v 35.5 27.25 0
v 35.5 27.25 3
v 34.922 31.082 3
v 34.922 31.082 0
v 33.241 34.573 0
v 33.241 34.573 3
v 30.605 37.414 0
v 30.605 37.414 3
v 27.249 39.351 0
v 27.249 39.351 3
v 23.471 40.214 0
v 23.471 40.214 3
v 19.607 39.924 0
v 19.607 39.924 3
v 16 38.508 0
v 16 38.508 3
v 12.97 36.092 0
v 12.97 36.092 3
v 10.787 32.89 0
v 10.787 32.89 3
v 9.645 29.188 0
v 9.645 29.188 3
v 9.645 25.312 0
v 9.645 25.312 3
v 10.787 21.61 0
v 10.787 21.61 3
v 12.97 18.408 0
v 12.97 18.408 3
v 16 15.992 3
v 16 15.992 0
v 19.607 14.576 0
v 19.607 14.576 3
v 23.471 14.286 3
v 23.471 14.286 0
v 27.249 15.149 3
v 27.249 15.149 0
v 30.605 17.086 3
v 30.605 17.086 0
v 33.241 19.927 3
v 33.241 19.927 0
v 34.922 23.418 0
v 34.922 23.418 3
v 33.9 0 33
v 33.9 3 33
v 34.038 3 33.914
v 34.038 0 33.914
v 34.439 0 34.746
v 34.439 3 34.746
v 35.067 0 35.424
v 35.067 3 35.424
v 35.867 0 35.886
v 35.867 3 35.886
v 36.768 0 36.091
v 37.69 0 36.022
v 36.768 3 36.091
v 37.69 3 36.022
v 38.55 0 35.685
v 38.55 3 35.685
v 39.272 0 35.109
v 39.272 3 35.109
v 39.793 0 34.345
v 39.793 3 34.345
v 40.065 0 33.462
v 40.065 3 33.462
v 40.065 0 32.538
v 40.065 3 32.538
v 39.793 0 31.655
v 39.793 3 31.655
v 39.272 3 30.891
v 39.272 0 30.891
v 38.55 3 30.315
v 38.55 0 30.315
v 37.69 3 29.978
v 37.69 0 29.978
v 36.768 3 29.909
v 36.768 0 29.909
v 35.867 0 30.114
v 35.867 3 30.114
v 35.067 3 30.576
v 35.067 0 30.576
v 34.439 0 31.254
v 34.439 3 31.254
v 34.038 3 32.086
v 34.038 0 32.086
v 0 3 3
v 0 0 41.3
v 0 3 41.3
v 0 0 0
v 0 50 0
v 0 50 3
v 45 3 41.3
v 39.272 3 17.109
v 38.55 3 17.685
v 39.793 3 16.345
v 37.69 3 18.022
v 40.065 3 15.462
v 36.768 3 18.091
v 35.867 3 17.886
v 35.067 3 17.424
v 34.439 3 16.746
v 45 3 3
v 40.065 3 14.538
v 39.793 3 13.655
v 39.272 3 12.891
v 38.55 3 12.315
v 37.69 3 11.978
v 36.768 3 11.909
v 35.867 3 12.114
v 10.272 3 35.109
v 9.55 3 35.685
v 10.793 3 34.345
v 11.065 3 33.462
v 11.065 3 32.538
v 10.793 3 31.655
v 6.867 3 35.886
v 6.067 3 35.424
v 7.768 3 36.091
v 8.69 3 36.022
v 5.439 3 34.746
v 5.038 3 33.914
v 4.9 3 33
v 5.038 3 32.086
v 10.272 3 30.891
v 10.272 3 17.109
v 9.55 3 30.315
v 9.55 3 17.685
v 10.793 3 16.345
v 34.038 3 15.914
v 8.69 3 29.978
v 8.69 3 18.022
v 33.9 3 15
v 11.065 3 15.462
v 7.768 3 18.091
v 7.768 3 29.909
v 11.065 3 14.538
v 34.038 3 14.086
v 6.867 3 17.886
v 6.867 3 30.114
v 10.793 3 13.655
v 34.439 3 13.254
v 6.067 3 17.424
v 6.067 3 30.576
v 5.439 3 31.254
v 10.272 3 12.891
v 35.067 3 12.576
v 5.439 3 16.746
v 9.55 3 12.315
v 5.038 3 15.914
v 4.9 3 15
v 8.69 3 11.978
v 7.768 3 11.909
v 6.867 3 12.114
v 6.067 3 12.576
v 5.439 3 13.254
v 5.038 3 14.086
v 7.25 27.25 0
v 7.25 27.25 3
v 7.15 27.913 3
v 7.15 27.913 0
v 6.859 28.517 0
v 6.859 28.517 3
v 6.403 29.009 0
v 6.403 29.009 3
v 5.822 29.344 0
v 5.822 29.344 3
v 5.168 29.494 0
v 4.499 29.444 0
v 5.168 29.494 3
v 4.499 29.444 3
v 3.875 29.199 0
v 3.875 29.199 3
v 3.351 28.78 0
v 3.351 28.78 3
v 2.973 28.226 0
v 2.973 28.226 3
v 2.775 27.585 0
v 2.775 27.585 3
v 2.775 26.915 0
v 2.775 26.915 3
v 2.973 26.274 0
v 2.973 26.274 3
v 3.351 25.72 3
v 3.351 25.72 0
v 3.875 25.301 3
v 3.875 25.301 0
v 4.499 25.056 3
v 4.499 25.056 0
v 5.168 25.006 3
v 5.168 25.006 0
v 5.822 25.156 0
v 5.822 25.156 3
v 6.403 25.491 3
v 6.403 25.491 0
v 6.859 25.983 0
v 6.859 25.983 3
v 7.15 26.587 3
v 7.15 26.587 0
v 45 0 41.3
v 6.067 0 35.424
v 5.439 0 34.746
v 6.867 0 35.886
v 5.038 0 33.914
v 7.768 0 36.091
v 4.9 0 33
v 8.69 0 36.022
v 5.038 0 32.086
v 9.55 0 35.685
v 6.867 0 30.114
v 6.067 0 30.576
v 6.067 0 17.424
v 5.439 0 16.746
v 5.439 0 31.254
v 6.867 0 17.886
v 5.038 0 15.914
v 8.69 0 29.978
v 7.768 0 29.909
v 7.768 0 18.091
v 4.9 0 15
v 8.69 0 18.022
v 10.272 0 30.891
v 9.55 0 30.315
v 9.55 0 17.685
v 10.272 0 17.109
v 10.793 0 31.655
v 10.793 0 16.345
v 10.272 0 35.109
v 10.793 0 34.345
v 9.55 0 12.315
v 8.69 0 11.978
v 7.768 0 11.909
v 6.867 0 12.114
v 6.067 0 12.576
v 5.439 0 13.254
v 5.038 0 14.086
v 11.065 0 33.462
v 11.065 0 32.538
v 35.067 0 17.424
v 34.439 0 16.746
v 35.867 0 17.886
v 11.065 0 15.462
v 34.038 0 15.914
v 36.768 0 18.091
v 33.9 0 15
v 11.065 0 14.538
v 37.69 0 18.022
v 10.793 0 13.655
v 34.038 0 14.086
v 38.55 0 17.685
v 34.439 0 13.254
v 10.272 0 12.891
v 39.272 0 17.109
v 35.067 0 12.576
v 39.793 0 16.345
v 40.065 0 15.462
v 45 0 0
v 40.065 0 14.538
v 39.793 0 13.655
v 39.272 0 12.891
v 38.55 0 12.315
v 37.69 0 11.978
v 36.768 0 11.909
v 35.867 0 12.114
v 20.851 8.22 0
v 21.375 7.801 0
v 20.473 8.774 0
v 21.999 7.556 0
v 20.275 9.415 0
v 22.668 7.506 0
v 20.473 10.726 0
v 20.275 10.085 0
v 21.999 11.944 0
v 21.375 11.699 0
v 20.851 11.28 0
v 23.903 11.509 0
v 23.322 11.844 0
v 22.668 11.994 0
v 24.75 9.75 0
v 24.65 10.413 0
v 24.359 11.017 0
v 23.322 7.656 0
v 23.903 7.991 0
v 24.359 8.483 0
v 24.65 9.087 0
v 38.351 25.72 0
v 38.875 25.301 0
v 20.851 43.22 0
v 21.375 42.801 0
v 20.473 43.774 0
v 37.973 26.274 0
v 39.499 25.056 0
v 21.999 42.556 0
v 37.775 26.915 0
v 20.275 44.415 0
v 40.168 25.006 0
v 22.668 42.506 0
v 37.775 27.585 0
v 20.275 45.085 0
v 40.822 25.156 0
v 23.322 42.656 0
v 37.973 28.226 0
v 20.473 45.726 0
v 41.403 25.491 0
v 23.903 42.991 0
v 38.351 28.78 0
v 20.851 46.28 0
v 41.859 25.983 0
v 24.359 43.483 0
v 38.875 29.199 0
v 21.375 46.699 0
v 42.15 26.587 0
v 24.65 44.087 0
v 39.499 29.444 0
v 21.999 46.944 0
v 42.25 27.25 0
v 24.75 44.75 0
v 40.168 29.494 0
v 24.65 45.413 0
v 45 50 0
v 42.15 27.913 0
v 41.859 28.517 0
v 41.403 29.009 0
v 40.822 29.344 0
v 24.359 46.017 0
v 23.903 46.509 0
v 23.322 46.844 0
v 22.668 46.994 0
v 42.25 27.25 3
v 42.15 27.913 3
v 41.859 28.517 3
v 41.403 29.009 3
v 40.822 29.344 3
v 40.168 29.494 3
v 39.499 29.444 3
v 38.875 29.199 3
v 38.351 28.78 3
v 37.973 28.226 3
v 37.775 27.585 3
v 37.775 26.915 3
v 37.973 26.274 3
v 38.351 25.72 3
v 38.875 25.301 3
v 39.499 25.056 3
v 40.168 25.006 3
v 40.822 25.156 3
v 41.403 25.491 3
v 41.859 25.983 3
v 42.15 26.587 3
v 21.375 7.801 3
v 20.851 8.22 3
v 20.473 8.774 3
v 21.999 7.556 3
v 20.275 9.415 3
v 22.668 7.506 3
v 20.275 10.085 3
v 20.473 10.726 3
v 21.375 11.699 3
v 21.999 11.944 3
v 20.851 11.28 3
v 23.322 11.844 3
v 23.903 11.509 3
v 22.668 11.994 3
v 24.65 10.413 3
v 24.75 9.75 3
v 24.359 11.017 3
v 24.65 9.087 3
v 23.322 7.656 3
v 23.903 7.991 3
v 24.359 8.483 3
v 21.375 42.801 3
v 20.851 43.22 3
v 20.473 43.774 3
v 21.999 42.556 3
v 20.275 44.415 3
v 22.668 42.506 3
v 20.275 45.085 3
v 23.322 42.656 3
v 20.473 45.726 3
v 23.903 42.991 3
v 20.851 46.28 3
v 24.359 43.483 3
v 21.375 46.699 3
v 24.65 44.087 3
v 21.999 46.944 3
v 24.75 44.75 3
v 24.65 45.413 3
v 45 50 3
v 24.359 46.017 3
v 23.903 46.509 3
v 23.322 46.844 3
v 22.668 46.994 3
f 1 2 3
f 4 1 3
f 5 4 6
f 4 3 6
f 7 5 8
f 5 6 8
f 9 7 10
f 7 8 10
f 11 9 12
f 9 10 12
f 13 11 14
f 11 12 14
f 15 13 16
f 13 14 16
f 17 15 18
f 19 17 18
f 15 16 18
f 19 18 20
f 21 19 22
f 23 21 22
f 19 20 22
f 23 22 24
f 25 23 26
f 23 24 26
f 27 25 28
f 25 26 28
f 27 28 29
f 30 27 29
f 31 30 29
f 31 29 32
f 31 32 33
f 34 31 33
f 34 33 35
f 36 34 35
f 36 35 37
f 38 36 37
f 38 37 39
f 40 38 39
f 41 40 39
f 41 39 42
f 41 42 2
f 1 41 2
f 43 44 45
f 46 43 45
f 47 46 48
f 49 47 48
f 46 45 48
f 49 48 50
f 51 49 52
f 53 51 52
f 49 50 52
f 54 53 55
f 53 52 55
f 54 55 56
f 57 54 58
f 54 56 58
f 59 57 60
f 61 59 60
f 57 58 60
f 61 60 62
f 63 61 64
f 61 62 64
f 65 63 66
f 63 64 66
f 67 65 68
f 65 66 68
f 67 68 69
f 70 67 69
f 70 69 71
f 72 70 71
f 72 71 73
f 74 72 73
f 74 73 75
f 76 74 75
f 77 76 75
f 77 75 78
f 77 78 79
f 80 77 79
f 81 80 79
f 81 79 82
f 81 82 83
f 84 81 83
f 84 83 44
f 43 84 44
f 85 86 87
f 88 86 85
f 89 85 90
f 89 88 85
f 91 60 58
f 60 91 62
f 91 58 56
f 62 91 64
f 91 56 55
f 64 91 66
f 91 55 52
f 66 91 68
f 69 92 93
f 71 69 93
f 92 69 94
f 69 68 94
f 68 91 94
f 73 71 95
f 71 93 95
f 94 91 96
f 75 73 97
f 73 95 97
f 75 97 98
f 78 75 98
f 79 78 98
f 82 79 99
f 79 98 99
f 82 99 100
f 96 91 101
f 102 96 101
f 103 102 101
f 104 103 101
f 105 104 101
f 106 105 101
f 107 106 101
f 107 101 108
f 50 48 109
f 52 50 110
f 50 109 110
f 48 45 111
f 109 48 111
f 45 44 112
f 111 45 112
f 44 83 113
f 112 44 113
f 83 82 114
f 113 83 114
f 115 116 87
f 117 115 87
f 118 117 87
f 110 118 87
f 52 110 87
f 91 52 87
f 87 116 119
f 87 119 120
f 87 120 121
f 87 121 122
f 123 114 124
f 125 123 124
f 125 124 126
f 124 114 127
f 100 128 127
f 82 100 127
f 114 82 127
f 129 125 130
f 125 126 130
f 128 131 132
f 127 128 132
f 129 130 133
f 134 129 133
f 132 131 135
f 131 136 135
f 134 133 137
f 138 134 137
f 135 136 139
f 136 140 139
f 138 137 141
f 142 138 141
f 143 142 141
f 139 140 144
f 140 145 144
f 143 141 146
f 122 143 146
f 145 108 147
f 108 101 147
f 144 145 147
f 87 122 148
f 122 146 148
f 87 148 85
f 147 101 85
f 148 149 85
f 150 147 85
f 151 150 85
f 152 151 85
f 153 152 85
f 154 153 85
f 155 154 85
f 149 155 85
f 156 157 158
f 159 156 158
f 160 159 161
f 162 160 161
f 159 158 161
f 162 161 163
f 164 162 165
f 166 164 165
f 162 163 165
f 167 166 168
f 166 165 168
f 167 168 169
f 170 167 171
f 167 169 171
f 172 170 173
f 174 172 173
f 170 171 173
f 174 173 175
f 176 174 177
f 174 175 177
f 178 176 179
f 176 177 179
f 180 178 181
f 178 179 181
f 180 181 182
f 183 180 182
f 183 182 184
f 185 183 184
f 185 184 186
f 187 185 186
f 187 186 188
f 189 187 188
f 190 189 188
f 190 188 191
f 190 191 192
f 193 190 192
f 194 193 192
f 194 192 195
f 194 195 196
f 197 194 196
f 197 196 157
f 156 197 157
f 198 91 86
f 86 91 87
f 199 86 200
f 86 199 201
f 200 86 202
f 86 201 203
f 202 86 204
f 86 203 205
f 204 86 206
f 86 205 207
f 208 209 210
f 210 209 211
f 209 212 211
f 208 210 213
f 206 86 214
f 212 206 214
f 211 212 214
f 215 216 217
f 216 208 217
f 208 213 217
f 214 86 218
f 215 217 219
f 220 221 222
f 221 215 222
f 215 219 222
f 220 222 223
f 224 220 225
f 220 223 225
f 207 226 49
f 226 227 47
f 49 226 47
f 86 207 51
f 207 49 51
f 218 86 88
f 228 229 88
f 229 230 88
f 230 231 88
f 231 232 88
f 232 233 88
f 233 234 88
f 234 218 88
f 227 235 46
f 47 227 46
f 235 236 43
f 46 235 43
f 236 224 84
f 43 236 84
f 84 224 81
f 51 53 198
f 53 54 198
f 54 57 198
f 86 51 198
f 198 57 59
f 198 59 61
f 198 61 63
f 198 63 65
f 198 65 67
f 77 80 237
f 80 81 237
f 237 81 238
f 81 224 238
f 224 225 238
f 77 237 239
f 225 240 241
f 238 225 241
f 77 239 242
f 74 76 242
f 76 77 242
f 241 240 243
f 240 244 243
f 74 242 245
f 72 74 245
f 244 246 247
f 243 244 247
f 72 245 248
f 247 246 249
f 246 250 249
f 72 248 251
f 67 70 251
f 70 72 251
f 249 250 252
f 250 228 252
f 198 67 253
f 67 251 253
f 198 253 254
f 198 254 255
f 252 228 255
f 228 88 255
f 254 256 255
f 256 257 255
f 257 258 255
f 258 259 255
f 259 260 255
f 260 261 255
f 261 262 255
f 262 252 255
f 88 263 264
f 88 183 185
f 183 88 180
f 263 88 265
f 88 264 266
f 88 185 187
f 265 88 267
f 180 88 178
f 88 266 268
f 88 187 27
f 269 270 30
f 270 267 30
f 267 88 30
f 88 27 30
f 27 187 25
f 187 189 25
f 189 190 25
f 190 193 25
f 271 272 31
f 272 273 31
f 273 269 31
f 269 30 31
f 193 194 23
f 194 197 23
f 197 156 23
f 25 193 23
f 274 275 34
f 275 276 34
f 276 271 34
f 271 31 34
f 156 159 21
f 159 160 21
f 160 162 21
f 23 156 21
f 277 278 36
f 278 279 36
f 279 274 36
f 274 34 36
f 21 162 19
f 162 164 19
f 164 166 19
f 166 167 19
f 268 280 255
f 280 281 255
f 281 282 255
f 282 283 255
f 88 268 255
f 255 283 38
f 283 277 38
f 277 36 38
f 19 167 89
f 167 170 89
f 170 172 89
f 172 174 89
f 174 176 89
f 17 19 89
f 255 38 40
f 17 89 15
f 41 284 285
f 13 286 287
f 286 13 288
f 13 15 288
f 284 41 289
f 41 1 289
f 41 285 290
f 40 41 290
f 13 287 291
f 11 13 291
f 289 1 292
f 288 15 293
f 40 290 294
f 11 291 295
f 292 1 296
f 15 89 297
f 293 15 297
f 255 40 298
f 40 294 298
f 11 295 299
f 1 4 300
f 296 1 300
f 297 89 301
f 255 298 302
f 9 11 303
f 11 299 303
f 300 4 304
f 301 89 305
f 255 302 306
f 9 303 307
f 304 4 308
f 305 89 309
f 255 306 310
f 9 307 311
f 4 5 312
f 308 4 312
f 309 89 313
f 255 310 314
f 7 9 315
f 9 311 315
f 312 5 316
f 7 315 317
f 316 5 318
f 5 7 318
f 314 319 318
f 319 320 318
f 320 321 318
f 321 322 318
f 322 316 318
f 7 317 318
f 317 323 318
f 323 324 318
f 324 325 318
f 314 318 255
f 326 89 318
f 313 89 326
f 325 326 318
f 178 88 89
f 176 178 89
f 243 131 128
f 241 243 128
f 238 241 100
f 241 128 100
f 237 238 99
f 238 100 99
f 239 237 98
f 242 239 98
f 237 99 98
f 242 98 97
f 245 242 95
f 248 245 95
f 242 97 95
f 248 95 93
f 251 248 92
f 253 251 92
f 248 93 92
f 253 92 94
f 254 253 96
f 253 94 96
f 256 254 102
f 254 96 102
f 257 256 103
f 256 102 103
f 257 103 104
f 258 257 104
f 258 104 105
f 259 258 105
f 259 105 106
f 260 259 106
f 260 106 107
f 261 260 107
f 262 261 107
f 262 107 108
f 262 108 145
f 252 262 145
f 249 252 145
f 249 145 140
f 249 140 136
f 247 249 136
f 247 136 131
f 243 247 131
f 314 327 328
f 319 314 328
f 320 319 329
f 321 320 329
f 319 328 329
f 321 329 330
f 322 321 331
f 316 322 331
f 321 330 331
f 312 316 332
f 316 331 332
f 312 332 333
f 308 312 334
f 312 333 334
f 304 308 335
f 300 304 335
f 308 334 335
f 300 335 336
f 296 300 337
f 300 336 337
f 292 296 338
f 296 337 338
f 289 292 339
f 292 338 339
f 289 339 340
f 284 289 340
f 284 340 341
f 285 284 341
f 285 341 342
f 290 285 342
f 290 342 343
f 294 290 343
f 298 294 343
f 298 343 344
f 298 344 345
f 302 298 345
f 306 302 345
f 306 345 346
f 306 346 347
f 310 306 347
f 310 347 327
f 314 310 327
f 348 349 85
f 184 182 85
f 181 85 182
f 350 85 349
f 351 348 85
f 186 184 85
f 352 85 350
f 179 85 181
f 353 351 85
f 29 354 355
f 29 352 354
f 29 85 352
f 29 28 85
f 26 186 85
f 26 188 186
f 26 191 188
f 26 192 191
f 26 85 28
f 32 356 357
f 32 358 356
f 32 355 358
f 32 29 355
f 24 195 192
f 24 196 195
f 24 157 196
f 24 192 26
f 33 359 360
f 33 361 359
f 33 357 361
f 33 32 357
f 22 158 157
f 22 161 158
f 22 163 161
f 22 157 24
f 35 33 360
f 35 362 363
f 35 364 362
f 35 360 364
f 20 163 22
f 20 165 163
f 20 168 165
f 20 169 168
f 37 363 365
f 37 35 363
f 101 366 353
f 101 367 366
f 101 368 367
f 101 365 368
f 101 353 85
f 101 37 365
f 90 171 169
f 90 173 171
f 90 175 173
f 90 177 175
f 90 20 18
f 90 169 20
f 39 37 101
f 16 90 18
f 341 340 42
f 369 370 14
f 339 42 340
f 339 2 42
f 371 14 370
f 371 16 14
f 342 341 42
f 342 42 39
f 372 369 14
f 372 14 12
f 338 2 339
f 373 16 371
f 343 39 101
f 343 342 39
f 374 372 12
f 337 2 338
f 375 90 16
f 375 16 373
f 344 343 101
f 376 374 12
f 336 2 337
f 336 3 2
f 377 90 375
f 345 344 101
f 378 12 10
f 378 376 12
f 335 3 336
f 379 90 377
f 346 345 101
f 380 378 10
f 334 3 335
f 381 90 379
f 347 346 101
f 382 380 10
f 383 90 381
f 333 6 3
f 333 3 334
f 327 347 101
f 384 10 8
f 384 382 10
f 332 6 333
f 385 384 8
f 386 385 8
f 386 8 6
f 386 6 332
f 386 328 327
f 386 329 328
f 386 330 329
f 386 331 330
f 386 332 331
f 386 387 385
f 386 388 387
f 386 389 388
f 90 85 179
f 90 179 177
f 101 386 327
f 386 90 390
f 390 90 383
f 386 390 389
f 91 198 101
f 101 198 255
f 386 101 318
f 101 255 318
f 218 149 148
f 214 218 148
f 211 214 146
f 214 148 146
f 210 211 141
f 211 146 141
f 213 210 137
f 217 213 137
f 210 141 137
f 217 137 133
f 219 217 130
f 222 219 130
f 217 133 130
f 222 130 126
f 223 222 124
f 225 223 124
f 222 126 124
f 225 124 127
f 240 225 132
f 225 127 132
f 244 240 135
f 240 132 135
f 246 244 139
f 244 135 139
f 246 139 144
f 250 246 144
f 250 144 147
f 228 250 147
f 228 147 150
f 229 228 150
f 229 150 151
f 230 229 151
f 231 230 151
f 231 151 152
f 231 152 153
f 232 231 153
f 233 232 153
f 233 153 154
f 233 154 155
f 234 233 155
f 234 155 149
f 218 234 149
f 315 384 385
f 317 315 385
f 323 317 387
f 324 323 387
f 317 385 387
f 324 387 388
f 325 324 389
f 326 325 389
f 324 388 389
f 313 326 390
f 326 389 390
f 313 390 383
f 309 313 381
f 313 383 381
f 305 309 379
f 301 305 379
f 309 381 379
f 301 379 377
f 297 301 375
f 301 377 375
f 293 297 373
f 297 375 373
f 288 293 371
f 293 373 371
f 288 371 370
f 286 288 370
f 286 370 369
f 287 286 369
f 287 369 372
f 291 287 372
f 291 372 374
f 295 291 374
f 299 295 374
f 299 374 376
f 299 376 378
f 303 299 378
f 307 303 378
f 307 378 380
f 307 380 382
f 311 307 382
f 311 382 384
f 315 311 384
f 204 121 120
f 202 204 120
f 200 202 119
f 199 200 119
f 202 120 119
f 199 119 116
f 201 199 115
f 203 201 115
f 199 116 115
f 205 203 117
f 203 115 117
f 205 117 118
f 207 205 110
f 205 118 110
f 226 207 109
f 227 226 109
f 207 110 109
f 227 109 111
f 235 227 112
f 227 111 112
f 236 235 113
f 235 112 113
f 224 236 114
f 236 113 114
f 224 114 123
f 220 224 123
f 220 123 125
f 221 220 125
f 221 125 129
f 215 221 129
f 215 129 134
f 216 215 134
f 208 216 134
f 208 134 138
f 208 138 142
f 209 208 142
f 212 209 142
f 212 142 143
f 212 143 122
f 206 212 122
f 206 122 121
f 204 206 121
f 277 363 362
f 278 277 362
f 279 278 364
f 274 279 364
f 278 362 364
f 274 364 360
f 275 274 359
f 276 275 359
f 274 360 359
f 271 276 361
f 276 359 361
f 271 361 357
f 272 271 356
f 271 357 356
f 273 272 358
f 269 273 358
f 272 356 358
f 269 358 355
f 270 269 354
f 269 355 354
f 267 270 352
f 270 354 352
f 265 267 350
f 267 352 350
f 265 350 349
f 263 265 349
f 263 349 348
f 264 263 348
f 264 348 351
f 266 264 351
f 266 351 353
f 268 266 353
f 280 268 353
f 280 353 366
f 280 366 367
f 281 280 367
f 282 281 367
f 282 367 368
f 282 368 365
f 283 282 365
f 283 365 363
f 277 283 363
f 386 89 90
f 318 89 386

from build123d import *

# Parameters (mm, degrees)
SKETCH_1_W          = 45
SKETCH_1_H          = 50
EXTRUDE_1_DEPTH     = 3
SKETCH_2_W          = 45
SKETCH_2_H          = 3
EXTRUDE_2_DEPTH     = 41.3
SKETCH_3_R          = 13
SKETCH_3_R_2        = 2.25
CUT_EXTRUDE_1_DEPTH = 78.407299397
SKETCH_4_R          = 3.1
CUT_EXTRUDE_2_DEPTH = 78.069384323


with BuildPart() as part:
    # 草图1 → 凸台-拉伸1 (new body)
    with BuildSketch(Plane.XY):
        with Locations((22.5, 25)):
            Rectangle(SKETCH_1_W, SKETCH_1_H)
    extrude(amount=EXTRUDE_1_DEPTH)

    # 草图2 → 凸台-拉伸2 (add)
    with BuildSketch(Plane(origin=(0, 0, 0), x_dir=(-1, 0, 0), z_dir=(0, 0, -1))):
        with Locations((-22.5, 1.5)):
            Rectangle(SKETCH_2_W, SKETCH_2_H)
    extrude(amount=-EXTRUDE_2_DEPTH)

    # 草图3 → 切除-拉伸1 (cut, through all)
    with BuildSketch(Plane.XY.offset(3)):
        with Locations((22.5, 27.25)):
            Circle(SKETCH_3_R)
        with Locations((22.5, 44.75)):
            Circle(SKETCH_3_R_2)
        with Locations((40, 27.25)):
            Circle(SKETCH_3_R_2)
        with Locations((22.5, 9.75)):
            Circle(SKETCH_3_R_2)
        with Locations((5, 27.25)):
            Circle(SKETCH_3_R_2)
    extrude(amount=-CUT_EXTRUDE_1_DEPTH, mode=Mode.SUBTRACT)

    # 草图4 → 切除-拉伸2 (cut, through all)
    with BuildSketch(Plane(origin=(0, 3, 0), x_dir=(1, 0, 0), z_dir=(0, 1, 0))):
        with Locations(Location((37, -15, 0), (0, 0, 180))):
            Circle(SKETCH_4_R)
        with Locations(Location((37, -33, 0), (0, 0, 180))):
            Circle(SKETCH_4_R)
        with Locations(Location((8, -33, 0), (0, 0, 180))):
            Circle(SKETCH_4_R)
        with Locations(Location((8, -15, 0), (0, 0, 180))):
            Circle(SKETCH_4_R)
    extrude(amount=-CUT_EXTRUDE_2_DEPTH, mode=Mode.SUBTRACT)


solid = part.part
